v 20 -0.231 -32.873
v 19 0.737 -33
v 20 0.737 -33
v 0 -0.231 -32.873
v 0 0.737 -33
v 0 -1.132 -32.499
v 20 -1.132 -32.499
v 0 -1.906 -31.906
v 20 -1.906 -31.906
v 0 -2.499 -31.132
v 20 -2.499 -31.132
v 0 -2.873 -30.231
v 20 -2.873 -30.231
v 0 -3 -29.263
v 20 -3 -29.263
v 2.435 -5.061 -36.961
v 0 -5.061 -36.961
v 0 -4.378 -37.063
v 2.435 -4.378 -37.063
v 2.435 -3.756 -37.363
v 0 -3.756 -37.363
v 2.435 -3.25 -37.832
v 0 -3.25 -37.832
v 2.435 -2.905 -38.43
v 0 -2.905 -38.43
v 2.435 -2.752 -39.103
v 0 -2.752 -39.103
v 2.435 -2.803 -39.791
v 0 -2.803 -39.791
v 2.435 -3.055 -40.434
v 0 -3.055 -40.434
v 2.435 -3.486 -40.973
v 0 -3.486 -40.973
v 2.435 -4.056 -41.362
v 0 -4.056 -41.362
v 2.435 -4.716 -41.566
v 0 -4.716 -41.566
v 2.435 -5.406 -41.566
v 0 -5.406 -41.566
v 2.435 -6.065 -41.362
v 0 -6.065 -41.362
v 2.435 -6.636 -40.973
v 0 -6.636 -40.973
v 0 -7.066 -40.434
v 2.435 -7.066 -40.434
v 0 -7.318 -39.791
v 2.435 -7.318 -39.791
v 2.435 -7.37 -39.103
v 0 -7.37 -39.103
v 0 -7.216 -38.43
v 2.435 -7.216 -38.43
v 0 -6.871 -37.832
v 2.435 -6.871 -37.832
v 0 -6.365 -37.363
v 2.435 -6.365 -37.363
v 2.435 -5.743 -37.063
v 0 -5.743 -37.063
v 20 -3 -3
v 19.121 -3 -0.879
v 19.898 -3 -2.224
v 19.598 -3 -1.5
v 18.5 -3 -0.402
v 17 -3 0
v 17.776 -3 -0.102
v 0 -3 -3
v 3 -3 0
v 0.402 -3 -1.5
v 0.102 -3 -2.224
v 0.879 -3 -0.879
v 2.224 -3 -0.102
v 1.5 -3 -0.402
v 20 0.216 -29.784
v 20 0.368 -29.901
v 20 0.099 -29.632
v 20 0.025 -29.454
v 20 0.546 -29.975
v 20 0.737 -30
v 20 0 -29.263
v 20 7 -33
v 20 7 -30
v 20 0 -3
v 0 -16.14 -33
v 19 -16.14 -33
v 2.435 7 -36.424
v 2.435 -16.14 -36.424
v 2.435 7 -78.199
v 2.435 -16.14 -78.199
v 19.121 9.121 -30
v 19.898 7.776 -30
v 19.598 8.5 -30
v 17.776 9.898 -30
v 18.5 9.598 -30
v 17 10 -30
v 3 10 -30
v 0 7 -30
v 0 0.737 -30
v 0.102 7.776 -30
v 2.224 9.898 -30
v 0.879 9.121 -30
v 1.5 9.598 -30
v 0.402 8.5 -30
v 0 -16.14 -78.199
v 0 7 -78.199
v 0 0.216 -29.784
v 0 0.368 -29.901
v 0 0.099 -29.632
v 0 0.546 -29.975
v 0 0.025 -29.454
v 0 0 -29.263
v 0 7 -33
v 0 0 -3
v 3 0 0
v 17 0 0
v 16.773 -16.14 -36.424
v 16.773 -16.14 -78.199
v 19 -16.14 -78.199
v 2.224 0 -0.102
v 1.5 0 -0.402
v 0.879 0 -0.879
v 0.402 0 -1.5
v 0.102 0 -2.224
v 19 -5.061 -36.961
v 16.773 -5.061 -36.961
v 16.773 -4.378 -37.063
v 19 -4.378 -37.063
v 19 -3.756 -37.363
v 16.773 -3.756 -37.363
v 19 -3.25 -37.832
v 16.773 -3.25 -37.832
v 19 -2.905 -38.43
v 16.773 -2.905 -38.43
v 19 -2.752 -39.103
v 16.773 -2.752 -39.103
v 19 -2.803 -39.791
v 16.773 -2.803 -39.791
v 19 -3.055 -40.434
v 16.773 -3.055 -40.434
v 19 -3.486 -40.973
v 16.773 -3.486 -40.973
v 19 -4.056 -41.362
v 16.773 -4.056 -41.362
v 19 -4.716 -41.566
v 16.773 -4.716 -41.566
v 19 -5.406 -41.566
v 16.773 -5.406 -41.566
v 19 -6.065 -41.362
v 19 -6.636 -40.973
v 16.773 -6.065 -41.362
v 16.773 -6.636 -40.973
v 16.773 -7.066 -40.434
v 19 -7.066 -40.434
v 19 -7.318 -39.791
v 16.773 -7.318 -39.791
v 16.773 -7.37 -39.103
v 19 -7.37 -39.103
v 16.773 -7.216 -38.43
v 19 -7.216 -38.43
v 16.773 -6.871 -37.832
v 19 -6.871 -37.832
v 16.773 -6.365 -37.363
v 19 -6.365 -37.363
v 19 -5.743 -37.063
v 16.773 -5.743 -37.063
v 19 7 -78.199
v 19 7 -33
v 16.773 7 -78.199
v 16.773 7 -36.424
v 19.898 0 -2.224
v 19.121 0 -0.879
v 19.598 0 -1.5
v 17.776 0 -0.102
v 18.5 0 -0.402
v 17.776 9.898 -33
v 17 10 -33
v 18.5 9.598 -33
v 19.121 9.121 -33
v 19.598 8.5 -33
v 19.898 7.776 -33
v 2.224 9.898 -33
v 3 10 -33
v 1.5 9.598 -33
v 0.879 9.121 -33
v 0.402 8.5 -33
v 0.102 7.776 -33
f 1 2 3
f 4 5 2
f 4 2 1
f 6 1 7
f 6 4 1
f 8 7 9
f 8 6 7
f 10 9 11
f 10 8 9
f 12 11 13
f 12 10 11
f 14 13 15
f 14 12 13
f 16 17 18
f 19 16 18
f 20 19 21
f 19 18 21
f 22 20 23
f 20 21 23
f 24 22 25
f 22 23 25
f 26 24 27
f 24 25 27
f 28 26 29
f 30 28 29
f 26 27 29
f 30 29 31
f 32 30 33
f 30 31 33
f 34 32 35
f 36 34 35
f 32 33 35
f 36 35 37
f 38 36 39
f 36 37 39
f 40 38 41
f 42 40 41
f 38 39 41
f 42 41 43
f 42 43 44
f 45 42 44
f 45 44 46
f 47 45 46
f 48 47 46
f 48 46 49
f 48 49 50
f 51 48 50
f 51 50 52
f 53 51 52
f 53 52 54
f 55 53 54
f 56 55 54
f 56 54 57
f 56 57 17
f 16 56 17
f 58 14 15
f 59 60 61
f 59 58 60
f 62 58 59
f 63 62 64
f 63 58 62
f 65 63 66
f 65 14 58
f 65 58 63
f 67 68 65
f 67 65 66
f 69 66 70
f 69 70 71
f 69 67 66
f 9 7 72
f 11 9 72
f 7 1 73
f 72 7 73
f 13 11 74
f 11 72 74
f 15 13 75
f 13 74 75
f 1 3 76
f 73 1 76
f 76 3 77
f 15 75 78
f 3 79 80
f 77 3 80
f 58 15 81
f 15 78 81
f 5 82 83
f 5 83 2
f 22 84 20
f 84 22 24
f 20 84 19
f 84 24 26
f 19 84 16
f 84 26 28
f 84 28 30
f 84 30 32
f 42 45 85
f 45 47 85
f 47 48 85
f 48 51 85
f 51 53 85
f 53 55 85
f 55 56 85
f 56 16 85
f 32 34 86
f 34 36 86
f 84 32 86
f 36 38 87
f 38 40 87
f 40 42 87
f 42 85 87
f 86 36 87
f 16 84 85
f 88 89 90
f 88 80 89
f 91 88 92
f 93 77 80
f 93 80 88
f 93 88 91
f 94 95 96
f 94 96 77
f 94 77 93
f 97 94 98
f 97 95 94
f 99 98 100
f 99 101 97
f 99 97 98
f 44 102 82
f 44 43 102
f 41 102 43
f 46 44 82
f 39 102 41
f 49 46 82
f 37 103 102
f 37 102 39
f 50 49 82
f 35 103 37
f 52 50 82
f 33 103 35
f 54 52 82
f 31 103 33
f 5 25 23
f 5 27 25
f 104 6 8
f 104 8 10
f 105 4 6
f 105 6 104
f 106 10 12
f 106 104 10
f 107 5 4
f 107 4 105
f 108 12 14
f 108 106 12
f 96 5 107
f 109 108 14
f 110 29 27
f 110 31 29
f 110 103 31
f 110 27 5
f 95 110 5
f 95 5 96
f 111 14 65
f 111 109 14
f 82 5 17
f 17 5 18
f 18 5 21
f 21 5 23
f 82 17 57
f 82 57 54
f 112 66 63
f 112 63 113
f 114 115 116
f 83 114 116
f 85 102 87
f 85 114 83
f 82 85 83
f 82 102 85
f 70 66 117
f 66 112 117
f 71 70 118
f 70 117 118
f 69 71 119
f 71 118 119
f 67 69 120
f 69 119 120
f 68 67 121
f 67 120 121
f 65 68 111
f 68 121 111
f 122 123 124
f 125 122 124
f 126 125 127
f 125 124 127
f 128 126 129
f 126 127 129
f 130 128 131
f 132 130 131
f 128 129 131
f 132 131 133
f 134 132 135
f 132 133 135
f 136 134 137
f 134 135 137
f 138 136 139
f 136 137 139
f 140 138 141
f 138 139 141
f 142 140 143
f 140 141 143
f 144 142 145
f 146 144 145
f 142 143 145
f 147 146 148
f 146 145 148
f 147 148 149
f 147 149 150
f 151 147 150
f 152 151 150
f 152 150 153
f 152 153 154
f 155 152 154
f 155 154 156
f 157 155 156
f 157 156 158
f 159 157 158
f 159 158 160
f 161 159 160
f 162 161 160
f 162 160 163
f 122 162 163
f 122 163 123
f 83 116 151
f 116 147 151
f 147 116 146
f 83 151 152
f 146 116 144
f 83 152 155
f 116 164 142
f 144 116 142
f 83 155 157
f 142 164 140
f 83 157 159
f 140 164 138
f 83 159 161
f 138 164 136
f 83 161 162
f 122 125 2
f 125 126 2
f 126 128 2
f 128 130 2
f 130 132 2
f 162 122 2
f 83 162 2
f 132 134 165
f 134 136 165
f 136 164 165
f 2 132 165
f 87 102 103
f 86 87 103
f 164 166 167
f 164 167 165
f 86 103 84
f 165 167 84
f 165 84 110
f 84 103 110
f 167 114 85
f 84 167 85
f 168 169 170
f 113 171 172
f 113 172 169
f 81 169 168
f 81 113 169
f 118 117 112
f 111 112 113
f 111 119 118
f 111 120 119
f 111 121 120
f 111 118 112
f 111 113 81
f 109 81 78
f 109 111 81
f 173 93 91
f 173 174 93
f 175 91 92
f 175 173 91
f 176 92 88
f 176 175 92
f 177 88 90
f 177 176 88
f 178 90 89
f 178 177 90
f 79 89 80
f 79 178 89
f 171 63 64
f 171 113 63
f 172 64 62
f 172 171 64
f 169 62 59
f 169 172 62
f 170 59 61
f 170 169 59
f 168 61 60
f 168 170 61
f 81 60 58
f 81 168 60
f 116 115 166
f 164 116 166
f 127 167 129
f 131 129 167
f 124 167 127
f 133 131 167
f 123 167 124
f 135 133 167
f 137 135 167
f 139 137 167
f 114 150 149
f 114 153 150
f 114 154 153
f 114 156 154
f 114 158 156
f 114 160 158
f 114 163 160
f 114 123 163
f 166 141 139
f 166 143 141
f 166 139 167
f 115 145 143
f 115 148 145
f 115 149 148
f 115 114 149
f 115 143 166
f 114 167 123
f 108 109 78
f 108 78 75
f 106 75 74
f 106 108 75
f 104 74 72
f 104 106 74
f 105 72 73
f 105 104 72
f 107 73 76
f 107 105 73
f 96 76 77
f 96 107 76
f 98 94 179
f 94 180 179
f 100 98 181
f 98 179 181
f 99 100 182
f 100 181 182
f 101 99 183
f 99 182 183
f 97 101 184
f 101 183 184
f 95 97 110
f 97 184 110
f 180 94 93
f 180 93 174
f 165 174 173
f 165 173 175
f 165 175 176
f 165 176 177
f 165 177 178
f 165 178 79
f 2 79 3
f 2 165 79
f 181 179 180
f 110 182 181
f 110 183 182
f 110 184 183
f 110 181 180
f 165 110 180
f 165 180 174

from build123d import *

# Parameters (mm, degrees)
BASE_FLANGE1_DEPTH  = 20
FILLET1_R           = 3
SKETCH2_W           = 45.198925831
SKETCH2_H           = 23.140478888
BOSS_EXTRUDE1_DEPTH = 19
SKETCH3_W           = 14.337687556
SKETCH3_H           = 41.775325978
CUT_EXTRUDE1_DEPTH  = 26
SKETCH4_R           = 2.315491067
CUT_EXTRUDE2_DEPTH  = 26


# Sheet-metal steps are written as plain solids
with BuildPart() as part:
    # Sketch1 → Base-Flange1 (new body)
    with BuildSketch(Plane(origin=(0, 0, 0), x_dir=(0, 0, -1), z_dir=(1, 0, 0))):
        with BuildLine():
            Line((0, 0), (29.2634, 0))
            ThreePointArc((29.2634, 0), (29.784254855, 0.215745145), (30, 0.7366))
            Line((30, 0.7366), (30, 10))
            Line((30, 10), (33, 10))
            Line((33, 10), (33, 0.7366))
            ThreePointArc((33, 0.7366), (31.905575199, -1.905575199), (29.2634, -3))
            Line((29.2634, -3), (0, -3))
            Line((0, -3), (0, 0))
        make_face()
    extrude(amount=BASE_FLANGE1_DEPTH)

    # Fillet1
    fillet1_edges = [part.edges().sort_by_distance(p)[0] for p in [
        (20, -1.5, 0),
        (20, 10, -31.5),
        (0, -1.5, 0),
        (0, 10, -31.5),
    ]]
    fillet(fillet1_edges, radius=FILLET1_R)

    # Sketch2 → Boss-Extrude1 (add)
    with BuildSketch(Plane.ZY):
        with Locations((-55.599462916, -4.570239444)):
            Rectangle(SKETCH2_W, SKETCH2_H)
    extrude(amount=-BOSS_EXTRUDE1_DEPTH)

    # Sketch3 → Cut-Extrude1 (cut)
    with BuildSketch(Plane(origin=(0, -16.140478888, 0), x_dir=(-1, 0, 0), z_dir=(0, -1, 0))):
        with Locations((-9.603922135, 57.311262842)):
            Rectangle(SKETCH3_W, SKETCH3_H)
    extrude(amount=-CUT_EXTRUDE1_DEPTH, mode=Mode.SUBTRACT)

    # Sketch4 → Cut-Extrude2 (cut)
    with BuildSketch(Plane.ZY):
        with Locations((-39.276024705, -5.060706685)):
            Circle(SKETCH4_R)
    extrude(amount=-CUT_EXTRUDE2_DEPTH, mode=Mode.SUBTRACT)


solid = part.part
